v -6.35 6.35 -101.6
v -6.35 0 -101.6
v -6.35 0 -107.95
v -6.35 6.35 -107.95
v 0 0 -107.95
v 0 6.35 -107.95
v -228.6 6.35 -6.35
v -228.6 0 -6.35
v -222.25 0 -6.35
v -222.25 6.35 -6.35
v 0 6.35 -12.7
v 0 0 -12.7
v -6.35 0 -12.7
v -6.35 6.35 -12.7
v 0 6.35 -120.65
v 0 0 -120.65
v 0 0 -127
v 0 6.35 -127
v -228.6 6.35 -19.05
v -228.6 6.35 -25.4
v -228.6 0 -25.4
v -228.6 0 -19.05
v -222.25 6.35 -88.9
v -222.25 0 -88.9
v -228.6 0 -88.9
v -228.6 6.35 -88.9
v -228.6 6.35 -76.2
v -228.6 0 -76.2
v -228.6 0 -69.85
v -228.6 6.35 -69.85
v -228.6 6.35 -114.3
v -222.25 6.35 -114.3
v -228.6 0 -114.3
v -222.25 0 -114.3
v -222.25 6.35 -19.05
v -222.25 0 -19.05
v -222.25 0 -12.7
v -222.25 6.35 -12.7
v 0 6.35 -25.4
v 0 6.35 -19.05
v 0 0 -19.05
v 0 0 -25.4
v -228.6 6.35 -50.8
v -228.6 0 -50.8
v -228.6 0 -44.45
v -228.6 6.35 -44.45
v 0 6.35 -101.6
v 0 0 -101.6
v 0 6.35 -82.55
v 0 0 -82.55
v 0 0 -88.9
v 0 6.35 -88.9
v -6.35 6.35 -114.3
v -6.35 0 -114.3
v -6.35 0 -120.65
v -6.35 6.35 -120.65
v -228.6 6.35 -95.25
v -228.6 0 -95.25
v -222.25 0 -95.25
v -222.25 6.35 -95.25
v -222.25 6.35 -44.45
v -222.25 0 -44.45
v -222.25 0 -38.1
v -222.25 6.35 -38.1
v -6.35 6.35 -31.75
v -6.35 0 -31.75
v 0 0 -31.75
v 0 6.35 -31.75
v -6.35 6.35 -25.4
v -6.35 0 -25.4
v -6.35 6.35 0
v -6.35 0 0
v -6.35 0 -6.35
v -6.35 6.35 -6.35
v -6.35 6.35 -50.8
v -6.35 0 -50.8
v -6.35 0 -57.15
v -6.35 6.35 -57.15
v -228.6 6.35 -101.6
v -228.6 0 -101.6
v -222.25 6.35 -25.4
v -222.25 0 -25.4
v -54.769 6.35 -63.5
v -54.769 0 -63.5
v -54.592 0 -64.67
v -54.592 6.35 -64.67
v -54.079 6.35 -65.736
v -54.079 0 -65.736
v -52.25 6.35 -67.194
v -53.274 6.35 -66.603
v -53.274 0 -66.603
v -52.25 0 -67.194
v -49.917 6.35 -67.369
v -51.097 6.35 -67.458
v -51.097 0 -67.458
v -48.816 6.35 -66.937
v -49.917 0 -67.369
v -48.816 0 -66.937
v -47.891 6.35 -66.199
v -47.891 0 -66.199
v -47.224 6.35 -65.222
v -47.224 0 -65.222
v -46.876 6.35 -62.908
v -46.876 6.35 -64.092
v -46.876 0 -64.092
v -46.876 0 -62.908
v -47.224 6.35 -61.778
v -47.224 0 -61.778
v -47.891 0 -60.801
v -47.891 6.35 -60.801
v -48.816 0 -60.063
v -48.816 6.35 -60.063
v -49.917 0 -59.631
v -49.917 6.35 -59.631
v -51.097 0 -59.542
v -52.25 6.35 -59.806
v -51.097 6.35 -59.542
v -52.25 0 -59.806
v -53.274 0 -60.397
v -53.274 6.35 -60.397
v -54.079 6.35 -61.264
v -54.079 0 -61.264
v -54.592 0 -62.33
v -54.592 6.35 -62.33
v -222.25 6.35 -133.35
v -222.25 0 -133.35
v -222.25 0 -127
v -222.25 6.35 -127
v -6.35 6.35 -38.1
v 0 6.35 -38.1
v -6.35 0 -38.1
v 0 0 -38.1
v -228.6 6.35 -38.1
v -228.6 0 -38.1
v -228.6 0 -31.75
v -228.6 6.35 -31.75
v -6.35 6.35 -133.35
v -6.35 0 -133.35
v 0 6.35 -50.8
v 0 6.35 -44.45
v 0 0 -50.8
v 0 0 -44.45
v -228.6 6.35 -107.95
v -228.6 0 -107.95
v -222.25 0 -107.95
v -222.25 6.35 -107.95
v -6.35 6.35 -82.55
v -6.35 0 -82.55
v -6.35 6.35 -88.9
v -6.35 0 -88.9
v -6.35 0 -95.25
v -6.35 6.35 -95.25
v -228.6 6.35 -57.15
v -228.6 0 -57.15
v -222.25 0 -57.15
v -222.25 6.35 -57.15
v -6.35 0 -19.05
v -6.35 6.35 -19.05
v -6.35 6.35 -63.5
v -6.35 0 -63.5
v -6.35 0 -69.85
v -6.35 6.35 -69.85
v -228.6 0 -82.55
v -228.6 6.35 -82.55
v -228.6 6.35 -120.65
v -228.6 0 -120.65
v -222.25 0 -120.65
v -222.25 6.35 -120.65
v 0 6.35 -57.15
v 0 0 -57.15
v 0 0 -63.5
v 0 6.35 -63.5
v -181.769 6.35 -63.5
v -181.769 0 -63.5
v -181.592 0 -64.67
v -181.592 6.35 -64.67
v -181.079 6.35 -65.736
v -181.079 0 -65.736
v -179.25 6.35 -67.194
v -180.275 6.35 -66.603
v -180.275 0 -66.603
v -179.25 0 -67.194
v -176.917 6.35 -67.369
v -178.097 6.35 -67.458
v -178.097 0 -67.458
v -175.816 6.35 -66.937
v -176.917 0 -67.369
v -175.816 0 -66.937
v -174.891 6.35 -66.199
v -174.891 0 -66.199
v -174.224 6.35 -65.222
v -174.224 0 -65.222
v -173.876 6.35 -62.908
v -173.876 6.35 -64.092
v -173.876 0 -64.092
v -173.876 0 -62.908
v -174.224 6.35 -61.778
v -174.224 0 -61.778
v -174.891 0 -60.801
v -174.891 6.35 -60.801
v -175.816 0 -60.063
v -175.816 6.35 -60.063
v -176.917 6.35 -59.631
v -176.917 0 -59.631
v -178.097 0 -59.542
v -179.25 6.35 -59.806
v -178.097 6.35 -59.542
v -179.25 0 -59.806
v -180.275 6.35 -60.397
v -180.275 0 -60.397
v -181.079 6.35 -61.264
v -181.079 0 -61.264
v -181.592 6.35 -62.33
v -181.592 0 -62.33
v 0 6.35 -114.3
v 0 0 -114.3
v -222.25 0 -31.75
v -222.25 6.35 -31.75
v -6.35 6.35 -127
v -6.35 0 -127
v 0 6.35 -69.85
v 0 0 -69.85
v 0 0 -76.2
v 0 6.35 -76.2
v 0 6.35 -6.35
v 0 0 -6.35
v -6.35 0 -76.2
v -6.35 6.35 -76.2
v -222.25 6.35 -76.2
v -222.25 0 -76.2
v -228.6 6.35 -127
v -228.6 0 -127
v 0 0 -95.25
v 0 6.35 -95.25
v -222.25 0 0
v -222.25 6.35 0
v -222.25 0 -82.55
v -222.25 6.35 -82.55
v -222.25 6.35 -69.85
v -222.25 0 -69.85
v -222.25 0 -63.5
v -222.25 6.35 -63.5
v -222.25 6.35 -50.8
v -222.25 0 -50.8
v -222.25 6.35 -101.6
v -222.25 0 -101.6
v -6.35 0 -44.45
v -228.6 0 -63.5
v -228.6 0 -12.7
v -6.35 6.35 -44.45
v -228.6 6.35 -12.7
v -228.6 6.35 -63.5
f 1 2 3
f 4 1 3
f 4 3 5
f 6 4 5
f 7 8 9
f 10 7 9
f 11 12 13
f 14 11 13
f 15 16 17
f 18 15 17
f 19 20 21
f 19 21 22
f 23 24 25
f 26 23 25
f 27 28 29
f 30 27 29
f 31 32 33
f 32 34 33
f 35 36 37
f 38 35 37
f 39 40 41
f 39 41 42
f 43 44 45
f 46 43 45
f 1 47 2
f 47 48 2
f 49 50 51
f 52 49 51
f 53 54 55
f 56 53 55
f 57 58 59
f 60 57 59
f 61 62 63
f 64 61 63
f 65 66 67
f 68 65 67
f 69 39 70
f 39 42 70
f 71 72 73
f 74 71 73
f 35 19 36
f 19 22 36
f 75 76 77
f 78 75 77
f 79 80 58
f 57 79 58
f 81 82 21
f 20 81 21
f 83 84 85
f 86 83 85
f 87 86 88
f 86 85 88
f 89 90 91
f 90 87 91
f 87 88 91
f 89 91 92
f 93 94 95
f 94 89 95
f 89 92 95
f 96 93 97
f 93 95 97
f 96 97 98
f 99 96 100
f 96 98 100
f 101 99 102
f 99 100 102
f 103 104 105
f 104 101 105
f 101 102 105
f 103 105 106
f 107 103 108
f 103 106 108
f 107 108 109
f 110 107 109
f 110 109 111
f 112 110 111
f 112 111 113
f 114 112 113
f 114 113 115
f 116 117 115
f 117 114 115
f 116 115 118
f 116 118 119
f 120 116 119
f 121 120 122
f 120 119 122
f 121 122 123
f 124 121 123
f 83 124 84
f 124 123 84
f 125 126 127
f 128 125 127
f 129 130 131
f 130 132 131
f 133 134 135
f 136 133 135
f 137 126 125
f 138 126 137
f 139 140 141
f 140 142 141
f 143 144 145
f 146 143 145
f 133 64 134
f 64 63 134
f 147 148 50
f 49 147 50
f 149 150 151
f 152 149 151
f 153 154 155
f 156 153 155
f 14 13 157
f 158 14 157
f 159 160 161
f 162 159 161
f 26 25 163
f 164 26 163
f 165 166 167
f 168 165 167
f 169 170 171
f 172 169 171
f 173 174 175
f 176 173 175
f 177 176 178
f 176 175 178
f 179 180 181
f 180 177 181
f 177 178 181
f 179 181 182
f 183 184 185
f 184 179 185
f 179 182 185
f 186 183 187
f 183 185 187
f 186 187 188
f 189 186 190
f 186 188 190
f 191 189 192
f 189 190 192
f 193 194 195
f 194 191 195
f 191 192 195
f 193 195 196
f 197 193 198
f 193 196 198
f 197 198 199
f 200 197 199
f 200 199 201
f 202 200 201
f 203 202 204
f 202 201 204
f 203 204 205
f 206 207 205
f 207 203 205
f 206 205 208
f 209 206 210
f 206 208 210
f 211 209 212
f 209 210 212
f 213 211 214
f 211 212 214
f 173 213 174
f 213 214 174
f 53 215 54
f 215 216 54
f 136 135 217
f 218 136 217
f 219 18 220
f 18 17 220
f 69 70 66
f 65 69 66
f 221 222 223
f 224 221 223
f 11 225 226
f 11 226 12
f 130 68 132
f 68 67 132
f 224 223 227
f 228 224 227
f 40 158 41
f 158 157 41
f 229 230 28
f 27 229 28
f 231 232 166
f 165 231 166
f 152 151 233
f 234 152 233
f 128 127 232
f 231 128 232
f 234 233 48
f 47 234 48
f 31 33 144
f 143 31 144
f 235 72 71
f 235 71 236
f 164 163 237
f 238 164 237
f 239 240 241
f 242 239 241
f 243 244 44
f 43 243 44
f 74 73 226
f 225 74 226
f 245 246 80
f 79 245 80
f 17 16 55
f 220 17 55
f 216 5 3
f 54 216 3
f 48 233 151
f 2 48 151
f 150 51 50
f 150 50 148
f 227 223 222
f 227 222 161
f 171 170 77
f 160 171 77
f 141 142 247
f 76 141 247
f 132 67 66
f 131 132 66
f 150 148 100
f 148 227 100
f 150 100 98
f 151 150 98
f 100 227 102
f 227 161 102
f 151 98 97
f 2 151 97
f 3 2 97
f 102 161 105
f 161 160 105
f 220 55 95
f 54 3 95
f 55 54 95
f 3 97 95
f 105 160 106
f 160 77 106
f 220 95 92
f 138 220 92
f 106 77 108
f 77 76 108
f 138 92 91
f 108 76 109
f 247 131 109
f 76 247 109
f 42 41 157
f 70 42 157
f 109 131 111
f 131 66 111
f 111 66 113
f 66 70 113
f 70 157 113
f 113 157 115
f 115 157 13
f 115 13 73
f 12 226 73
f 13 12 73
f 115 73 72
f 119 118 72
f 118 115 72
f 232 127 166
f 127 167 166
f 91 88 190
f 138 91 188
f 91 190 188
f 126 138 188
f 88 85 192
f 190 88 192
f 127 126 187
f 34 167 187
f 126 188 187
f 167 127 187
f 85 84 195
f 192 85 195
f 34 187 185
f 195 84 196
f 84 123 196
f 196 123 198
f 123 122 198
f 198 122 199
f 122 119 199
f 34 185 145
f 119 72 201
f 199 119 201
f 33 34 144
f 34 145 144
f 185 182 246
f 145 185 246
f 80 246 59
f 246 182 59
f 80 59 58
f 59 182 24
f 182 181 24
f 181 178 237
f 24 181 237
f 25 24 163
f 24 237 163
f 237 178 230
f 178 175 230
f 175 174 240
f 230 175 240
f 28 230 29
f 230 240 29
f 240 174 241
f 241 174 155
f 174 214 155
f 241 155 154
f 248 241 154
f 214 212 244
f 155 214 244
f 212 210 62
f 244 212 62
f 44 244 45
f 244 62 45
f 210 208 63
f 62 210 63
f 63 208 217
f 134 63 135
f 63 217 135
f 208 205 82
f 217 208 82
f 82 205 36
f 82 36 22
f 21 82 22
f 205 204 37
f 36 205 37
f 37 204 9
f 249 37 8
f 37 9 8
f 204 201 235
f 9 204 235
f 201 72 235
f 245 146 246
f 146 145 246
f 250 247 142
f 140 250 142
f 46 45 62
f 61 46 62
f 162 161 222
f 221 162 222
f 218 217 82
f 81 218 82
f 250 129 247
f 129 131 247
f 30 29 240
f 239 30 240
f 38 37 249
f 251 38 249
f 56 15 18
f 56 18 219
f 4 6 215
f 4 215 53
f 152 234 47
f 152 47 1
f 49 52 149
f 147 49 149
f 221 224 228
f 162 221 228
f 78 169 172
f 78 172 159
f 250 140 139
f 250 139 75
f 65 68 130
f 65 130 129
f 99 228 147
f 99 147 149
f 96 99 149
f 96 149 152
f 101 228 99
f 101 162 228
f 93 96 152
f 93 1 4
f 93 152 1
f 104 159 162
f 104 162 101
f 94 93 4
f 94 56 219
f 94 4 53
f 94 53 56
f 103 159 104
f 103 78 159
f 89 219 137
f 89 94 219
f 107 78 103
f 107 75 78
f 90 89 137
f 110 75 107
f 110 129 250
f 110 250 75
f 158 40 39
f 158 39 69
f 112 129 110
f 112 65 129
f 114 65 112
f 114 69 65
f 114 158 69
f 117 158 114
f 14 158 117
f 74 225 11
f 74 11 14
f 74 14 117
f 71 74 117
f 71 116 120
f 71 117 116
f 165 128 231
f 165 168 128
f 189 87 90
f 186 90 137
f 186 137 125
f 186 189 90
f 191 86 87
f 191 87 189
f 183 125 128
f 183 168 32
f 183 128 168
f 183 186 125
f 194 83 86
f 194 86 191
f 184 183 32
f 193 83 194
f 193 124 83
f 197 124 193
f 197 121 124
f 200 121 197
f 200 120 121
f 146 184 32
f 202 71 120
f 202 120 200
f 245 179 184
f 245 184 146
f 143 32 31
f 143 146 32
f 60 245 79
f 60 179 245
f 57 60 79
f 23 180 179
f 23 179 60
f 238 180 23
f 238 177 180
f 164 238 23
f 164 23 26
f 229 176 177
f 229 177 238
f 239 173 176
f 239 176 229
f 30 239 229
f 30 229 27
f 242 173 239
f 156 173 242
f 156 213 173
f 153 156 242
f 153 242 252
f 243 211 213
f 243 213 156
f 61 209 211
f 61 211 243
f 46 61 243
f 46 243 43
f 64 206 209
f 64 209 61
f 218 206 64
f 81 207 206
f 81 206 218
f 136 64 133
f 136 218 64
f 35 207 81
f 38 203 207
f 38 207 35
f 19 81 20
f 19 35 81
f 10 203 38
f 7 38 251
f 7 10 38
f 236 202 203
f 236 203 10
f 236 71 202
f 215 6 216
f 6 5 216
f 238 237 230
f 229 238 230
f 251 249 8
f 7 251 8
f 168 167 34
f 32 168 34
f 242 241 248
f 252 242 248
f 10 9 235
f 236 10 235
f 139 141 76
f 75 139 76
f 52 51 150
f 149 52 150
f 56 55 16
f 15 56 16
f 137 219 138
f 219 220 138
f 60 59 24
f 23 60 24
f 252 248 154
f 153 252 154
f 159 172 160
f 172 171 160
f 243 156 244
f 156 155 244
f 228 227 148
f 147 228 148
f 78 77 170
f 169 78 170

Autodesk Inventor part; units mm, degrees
ref_plane "YZ Plane" through (0, 0, 0) normal (1, 0, 0) x (0, 1, 0)
ref_plane "XZ Plane" through (0, 0, 0) normal (0, 1, 0) x (-1, 0, 0)
ref_plane "XY Plane" through (0, 0, 0) normal (0, 0, 1) x (1, 0, 0)
sketch "Sketch5" plane through (0, 0, 0) normal (0, 1, 0) x (-1, 0, 0)
  circle A0 centre (177.8, -63.5) radius 3.9688
  circle A1 centre (50.8, -63.5) radius 3.9687
  line L0 (6.35, 0) -> (6.35, -6.35)
  line L1 (6.35, -6.35) -> (0, -6.35)
  line L2 (0, -6.35) -> (0, -12.7)
  line L3 (0, -12.7) -> (6.35, -12.7)
  line L4 (6.35, -12.7) -> (6.35, -19.05)
  line L5 (6.35, -19.05) -> (0, -19.05)
  line L6 (0, -19.05) -> (0, -25.4)
  line L7 (0, -25.4) -> (6.35, -25.4)
  line L8 (6.35, -25.4) -> (6.35, -31.75)
  line L9 (6.35, -31.75) -> (0, -31.75)
  line L10 (0, -31.75) -> (0, -38.1)
  line L11 (0, -38.1) -> (6.35, -38.1)
  line L12 (6.35, -38.1) -> (6.35, -44.45)
  line L13 (6.35, -44.45) -> (0, -44.45)
  line L14 (0, -44.45) -> (0, -50.8)
  line L15 (0, -50.8) -> (6.35, -50.8)
  line L16 (6.35, -50.8) -> (6.35, -57.15)
  line L17 (6.35, -57.15) -> (0, -57.15)
  line L18 (0, -57.15) -> (0, -63.5)
  line L19 (0, -63.5) -> (6.35, -63.5)
  line L20 (6.35, -63.5) -> (6.35, -69.85)
  line L21 (6.35, -69.85) -> (0, -69.85)
  line L22 (0, -69.85) -> (0, -76.2)
  line L23 (0, -76.2) -> (6.35, -76.2)
  line L24 (6.35, -76.2) -> (6.35, -82.55)
  line L25 (6.35, -82.55) -> (0, -82.55)
  line L26 (0, -82.55) -> (0, -88.9)
  line L27 (0, -88.9) -> (6.35, -88.9)
  line L28 (6.35, -88.9) -> (6.35, -95.25)
  line L29 (6.35, -95.25) -> (0, -95.25)
  line L30 (0, -95.25) -> (0, -101.6)
  line L31 (0, -101.6) -> (6.35, -101.6)
  line L32 (6.35, -101.6) -> (6.35, -107.95)
  line L33 (6.35, -107.95) -> (0, -107.95)
  line L34 (0, -107.95) -> (0, -114.3)
  line L35 (0, -114.3) -> (6.35, -114.3)
  line L36 (6.35, -114.3) -> (6.35, -120.65)
  line L37 (6.35, -120.65) -> (0, -120.65)
  line L38 (0, -120.65) -> (0, -127)
  line L39 (0, -127) -> (6.35, -127)
  line L40 (6.35, -127) -> (6.35, -133.35)
  line L41 (222.25, -133.35) -> (222.25, -127)
  line L42 (222.25, -127) -> (228.6, -127)
  line L43 (228.6, -127) -> (228.6, -120.65)
  line L44 (228.6, -120.65) -> (222.25, -120.65)
  line L45 (222.25, -120.65) -> (222.25, -114.3)
  line L46 (222.25, -114.3) -> (228.6, -114.3)
  line L47 (228.6, -114.3) -> (228.6, -107.95)
  line L48 (228.6, -107.95) -> (222.25, -107.95)
  line L49 (222.25, -107.95) -> (222.25, -101.6)
  line L50 (222.25, -101.6) -> (228.6, -101.6)
  line L51 (228.6, -101.6) -> (228.6, -95.25)
  line L52 (228.6, -95.25) -> (222.25, -95.25)
  line L53 (222.25, -95.25) -> (222.25, -88.9)
  line L54 (222.25, -88.9) -> (228.6, -88.9)
  line L55 (228.6, -88.9) -> (228.6, -82.55)
  line L56 (228.6, -82.55) -> (222.25, -82.55)
  line L57 (222.25, -82.55) -> (222.25, -76.2)
  line L58 (222.25, -76.2) -> (228.6, -76.2)
  line L59 (228.6, -76.2) -> (228.6, -69.85)
  line L60 (228.6, -69.85) -> (222.25, -69.85)
  line L61 (222.25, -69.85) -> (222.25, -63.5)
  line L62 (222.25, -63.5) -> (228.6, -63.5)
  line L63 (228.6, -63.5) -> (228.6, -57.15)
  line L64 (228.6, -57.15) -> (222.25, -57.15)
  line L65 (222.25, -57.15) -> (222.25, -50.8)
  line L66 (222.25, -50.8) -> (228.6, -50.8)
  line L67 (228.6, -50.8) -> (228.6, -44.45)
  line L68 (228.6, -44.45) -> (222.25, -44.45)
  line L69 (222.25, -44.45) -> (222.25, -38.1)
  line L70 (222.25, -38.1) -> (228.6, -38.1)
  line L71 (228.6, -38.1) -> (228.6, -31.75)
  line L72 (228.6, -31.75) -> (222.25, -31.75)
  line L73 (222.25, -31.75) -> (222.25, -25.4)
  line L74 (222.25, -25.4) -> (228.6, -25.4)
  line L75 (228.6, -25.4) -> (228.6, -19.05)
  line L76 (228.6, -19.05) -> (222.25, -19.05)
  line L77 (222.25, -19.05) -> (222.25, -12.7)
  line L78 (222.25, -12.7) -> (228.6, -12.7)
  line L79 (228.6, -12.7) -> (228.6, -6.35)
  line L80 (228.6, -6.35) -> (222.25, -6.35)
  line L81 (222.25, -6.35) -> (222.25, 0)
  line L82 (6.35, 0) -> (222.25, 0)
  line L83 (222.25, -133.35) -> (6.35, -133.35)
  point P0 (0, 0)
  dimension "Shaft_Diameter" = 7.9375
  dimension "d59" = 7.9375
  dimension "d73" = 6.35
  dimension "Teeth_Width" = 6.35
  dimension "d79" = 6.35
  dimension "d80" = 6.35
  dimension "d81" = 6.35
  dimension "d82" = 6.35
  dimension "d92" = 6.35
  dimension "d93" = 6.35
  dimension "d94" = 6.35
  dimension "d95" = 6.35
  dimension "d96" = 6.35
  dimension "d97" = 6.35
  dimension "d100" = 6.35
  dimension "d101" = 6.35
  dimension "d102" = 6.35
  dimension "d103" = 6.35
  dimension "d106" = 6.35
  dimension "d107" = 6.35
  dimension "d108" = 6.35
  dimension "d109" = 6.35
  dimension "d112" = 6.35
  dimension "d113" = 6.35
  dimension "d114" = 6.35
  dimension "d115" = 6.35
  dimension "d118" = 6.35
  dimension "d119" = 6.35
  dimension "d120" = 6.35
  dimension "d121" = 6.35
  dimension "d124" = 6.35
  dimension "d125" = 6.35
  dimension "d126" = 6.35
  dimension "d127" = 6.35
  dimension "d130" = 6.35
  dimension "d131" = 6.35
  dimension "d132" = 6.35
  dimension "d133" = 6.35
  dimension "d136" = 6.35
  dimension "d137" = 6.35
  dimension "d138" = 6.35
  dimension "d139" = 6.35
  dimension "d143" = 6.35
  dimension "d149" = 6.35
  dimension "d150" = 6.35
  dimension "d151" = 6.35
  dimension "d152" = 6.35
  dimension "d153" = 6.35
  dimension "d154" = 6.35
  dimension "d155" = 6.35
  dimension "d156" = 6.35
  dimension "d157" = 6.35
  dimension "d158" = 6.35
  dimension "d159" = 6.35
  dimension "d160" = 6.35
  dimension "d161" = 6.35
  dimension "d162" = 6.35
  dimension "d163" = 6.35
  dimension "d164" = 6.35
  dimension "d165" = 6.35
  dimension "d166" = 6.35
  dimension "d167" = 6.35
  dimension "d168" = 6.35
  dimension "d169" = 6.35
extrude "Extrusion4" add sketch "Sketch5" along normal blind 6.35
equation "\"d59\" = Shaft_Diameter"
properties part number "Base"
